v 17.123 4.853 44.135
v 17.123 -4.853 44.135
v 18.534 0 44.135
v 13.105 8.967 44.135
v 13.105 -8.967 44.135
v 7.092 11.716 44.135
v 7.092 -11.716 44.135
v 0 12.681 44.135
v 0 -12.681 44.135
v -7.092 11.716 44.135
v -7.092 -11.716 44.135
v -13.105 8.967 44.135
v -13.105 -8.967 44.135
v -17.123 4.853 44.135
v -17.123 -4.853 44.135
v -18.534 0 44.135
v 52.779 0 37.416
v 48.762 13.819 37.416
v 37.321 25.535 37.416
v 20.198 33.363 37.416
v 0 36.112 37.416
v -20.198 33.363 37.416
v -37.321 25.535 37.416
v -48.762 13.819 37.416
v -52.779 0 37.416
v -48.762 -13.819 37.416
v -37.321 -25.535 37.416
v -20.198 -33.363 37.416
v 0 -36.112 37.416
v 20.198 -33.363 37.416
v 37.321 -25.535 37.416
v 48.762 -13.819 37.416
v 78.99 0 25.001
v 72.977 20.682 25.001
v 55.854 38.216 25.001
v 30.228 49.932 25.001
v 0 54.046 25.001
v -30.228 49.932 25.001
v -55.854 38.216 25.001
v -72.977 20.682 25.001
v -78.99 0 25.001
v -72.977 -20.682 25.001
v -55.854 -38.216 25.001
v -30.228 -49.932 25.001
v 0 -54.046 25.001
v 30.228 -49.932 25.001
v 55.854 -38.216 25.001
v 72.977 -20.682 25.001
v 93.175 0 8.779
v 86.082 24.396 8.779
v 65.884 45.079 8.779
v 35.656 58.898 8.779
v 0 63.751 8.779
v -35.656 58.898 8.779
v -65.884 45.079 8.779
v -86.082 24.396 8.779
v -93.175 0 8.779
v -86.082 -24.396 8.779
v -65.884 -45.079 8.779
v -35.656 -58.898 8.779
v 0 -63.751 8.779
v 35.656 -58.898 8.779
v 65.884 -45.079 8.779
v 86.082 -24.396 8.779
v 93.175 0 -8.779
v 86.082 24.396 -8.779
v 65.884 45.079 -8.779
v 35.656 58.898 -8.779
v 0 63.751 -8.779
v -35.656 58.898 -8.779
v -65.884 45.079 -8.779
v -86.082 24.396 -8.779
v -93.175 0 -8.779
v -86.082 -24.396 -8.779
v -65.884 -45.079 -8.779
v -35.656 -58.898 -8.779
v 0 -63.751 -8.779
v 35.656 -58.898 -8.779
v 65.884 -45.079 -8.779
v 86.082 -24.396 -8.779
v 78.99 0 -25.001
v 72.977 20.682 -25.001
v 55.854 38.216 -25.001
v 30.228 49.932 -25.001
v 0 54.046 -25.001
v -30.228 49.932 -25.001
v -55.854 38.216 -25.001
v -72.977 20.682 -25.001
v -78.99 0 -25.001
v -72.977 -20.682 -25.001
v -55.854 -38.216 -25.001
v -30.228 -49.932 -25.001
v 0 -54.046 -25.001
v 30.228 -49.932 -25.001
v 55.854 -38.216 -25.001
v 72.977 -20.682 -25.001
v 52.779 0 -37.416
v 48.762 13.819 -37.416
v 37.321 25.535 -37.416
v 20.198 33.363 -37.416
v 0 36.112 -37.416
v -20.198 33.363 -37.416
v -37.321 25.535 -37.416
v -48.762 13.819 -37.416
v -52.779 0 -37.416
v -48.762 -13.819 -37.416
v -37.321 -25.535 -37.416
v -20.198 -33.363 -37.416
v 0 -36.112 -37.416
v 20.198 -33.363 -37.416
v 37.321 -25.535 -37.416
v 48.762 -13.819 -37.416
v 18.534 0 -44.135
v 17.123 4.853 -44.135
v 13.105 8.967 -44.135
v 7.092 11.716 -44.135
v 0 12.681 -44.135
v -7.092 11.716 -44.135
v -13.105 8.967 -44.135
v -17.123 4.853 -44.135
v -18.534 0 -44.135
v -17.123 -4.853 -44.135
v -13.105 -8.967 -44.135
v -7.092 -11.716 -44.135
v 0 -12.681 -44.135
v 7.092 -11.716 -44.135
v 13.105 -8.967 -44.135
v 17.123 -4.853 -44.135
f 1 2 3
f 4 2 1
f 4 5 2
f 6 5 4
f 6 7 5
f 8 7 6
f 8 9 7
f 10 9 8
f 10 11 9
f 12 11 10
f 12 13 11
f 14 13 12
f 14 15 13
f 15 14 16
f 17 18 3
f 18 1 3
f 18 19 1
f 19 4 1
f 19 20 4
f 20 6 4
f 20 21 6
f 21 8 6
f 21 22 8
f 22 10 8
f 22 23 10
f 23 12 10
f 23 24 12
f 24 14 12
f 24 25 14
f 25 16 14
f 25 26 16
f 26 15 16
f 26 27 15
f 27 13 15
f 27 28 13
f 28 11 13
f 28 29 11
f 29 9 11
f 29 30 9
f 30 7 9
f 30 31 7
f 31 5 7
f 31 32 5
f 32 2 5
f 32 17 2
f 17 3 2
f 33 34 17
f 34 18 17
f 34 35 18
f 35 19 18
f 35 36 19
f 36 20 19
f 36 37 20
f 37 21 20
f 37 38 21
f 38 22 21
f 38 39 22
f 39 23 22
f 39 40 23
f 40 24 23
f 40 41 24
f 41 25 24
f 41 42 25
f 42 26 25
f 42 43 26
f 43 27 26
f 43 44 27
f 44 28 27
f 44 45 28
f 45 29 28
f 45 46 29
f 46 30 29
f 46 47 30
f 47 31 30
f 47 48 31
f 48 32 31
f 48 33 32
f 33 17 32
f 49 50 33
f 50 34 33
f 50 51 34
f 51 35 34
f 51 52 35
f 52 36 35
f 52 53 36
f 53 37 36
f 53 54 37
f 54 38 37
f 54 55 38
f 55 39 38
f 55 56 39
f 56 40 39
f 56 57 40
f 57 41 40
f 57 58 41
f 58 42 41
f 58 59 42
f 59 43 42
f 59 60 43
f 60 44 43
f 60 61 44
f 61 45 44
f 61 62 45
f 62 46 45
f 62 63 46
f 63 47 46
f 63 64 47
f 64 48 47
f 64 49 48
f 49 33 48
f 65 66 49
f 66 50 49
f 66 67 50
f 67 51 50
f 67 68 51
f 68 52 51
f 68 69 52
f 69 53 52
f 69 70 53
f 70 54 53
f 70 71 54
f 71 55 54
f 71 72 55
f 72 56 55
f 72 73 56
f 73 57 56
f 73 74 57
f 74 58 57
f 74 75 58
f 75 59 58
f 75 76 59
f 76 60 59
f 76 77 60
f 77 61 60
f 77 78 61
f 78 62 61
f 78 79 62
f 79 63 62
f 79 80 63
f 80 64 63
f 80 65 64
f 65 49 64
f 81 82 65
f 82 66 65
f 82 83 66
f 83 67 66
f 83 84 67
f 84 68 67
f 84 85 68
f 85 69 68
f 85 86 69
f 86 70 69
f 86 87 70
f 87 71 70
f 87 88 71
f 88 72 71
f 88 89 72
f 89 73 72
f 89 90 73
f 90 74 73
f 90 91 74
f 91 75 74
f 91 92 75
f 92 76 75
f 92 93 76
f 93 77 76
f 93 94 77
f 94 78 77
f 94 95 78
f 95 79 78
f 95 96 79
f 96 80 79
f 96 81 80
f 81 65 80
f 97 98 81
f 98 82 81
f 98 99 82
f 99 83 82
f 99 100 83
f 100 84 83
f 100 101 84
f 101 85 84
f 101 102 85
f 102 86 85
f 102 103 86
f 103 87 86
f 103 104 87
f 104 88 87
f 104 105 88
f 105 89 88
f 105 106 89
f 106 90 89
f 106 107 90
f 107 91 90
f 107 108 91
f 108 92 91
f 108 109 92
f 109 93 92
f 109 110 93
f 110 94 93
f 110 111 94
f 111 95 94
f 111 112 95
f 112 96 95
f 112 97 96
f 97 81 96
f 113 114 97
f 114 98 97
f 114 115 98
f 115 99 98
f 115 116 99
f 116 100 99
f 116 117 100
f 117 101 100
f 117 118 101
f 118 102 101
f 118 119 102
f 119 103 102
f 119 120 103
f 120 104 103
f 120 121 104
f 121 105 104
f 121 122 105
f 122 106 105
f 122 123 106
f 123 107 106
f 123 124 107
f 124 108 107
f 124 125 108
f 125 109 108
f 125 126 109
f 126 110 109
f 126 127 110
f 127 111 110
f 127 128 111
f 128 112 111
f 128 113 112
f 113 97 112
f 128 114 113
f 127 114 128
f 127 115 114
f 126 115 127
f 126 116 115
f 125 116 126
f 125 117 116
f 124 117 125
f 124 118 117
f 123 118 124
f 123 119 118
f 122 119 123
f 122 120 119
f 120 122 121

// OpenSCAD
// Generated by SolidPython 1.0.1 on 2020-07-29 00:46:54


scale(v = [19, 13, 9]) {
	sphere(r = 5);
}
/***********************************************
*********      SolidPython code:      **********
************************************************
 
# import packages: SolidPython
from solid import *
from solid.utils import *
from itertools import chain, combinations, permutations


class Resize:

    def __init__(self, scad_file):
        self.scad_file = scad_file
        #self.scad_file = import_scad(scad_file)
        # cone/cylinder param:
        self.r1 = 0
        self.r2 = 0
        self.h = 0
        # rectangular prism param:
        self.w = 0
        self.l = 0
        # ellipse param:
        self.r = 0

    # import OpenScad code (file name corresponds to shape)


    # classify shape + parameters
    def assign(self, param1, param2, param3):
        if self.scad_file == 'cone.scad':
            self.r1 = param1
            self.r2 = param2
            self.h = param3
        elif self.scad_file == 'cylinder.scad':
            self.r1 = param1
            self.r2 = param2
            self.h = param3
        elif self.scad_file == 'rectangularPrism.scad':
            self.h = param1
            self.l = param2
            self.w = param3
        else:
            self.r = param1
            self.h = param2

    # resize parameters
    def iterate(self):
        x = range(3, 20, 2)
        i = 1
        if self.scad_file == 'cone.scad':
            tempList = list(permutations(x, 2))
            for temp in tempList:
                param1 = temp[0]
                param2 = temp[1]
                filepath = 'produced_scad_files/' + 'cone' + str(param1) + '_' + str(param2) + '_' + '.scad'
                scad_render_to_file(cylinder(h=param1, r1=param2, r2=0), filepath)

        elif self.scad_file == 'cylinder.scad':
            tempList = list(permutations(x, 3))
            for temp in tempList:
                param1 = temp[0]
                param2 = temp[1]
                filepath = 'produced_scad_files/' + 'cylinder' + str(param1) + '_' + str(param2) + '_' + '.scad'
                scad_render_to_file(cylinder(h=param1, r1=param2, r2=param2), filepath)

        elif self.scad_file == 'rectangularPrism.scad':
            tempList = list(permutations(x, 3))
            for temp in tempList:
                param1 = temp[0]
                param2 = temp[1]
                param3 = temp[2]
                filepath = 'produced_scad_files/' + 'rectangularPrism' + str(param1) + '_' + str(param2) + '_' + str(
                    param3) + '.scad'
                scad_render_to_file(cube(size=(param1, param2, param3)), filepath)

        elif self.scad_file == 'ellipse.scad':
            tempList = list(permutations(x, 4))
            for temp in tempList:
                param1 = temp[0]
                param2 = temp[1]
                param3 = temp[2]
                param4 = temp[3]
                filepath = 'produced_scad_files/' + 'ellipse' + str(param1) + '_' + str(param2) + '_' + str(param3) + '_' + str(param4) + '.scad'
                scad_render_to_file(scale([param1, param2, param3])(sphere(r=param4)), filepath)

    def render_to_scadfile(self):
        scad_render_to_file(scad, 'example.scad') 
 
************************************************/
